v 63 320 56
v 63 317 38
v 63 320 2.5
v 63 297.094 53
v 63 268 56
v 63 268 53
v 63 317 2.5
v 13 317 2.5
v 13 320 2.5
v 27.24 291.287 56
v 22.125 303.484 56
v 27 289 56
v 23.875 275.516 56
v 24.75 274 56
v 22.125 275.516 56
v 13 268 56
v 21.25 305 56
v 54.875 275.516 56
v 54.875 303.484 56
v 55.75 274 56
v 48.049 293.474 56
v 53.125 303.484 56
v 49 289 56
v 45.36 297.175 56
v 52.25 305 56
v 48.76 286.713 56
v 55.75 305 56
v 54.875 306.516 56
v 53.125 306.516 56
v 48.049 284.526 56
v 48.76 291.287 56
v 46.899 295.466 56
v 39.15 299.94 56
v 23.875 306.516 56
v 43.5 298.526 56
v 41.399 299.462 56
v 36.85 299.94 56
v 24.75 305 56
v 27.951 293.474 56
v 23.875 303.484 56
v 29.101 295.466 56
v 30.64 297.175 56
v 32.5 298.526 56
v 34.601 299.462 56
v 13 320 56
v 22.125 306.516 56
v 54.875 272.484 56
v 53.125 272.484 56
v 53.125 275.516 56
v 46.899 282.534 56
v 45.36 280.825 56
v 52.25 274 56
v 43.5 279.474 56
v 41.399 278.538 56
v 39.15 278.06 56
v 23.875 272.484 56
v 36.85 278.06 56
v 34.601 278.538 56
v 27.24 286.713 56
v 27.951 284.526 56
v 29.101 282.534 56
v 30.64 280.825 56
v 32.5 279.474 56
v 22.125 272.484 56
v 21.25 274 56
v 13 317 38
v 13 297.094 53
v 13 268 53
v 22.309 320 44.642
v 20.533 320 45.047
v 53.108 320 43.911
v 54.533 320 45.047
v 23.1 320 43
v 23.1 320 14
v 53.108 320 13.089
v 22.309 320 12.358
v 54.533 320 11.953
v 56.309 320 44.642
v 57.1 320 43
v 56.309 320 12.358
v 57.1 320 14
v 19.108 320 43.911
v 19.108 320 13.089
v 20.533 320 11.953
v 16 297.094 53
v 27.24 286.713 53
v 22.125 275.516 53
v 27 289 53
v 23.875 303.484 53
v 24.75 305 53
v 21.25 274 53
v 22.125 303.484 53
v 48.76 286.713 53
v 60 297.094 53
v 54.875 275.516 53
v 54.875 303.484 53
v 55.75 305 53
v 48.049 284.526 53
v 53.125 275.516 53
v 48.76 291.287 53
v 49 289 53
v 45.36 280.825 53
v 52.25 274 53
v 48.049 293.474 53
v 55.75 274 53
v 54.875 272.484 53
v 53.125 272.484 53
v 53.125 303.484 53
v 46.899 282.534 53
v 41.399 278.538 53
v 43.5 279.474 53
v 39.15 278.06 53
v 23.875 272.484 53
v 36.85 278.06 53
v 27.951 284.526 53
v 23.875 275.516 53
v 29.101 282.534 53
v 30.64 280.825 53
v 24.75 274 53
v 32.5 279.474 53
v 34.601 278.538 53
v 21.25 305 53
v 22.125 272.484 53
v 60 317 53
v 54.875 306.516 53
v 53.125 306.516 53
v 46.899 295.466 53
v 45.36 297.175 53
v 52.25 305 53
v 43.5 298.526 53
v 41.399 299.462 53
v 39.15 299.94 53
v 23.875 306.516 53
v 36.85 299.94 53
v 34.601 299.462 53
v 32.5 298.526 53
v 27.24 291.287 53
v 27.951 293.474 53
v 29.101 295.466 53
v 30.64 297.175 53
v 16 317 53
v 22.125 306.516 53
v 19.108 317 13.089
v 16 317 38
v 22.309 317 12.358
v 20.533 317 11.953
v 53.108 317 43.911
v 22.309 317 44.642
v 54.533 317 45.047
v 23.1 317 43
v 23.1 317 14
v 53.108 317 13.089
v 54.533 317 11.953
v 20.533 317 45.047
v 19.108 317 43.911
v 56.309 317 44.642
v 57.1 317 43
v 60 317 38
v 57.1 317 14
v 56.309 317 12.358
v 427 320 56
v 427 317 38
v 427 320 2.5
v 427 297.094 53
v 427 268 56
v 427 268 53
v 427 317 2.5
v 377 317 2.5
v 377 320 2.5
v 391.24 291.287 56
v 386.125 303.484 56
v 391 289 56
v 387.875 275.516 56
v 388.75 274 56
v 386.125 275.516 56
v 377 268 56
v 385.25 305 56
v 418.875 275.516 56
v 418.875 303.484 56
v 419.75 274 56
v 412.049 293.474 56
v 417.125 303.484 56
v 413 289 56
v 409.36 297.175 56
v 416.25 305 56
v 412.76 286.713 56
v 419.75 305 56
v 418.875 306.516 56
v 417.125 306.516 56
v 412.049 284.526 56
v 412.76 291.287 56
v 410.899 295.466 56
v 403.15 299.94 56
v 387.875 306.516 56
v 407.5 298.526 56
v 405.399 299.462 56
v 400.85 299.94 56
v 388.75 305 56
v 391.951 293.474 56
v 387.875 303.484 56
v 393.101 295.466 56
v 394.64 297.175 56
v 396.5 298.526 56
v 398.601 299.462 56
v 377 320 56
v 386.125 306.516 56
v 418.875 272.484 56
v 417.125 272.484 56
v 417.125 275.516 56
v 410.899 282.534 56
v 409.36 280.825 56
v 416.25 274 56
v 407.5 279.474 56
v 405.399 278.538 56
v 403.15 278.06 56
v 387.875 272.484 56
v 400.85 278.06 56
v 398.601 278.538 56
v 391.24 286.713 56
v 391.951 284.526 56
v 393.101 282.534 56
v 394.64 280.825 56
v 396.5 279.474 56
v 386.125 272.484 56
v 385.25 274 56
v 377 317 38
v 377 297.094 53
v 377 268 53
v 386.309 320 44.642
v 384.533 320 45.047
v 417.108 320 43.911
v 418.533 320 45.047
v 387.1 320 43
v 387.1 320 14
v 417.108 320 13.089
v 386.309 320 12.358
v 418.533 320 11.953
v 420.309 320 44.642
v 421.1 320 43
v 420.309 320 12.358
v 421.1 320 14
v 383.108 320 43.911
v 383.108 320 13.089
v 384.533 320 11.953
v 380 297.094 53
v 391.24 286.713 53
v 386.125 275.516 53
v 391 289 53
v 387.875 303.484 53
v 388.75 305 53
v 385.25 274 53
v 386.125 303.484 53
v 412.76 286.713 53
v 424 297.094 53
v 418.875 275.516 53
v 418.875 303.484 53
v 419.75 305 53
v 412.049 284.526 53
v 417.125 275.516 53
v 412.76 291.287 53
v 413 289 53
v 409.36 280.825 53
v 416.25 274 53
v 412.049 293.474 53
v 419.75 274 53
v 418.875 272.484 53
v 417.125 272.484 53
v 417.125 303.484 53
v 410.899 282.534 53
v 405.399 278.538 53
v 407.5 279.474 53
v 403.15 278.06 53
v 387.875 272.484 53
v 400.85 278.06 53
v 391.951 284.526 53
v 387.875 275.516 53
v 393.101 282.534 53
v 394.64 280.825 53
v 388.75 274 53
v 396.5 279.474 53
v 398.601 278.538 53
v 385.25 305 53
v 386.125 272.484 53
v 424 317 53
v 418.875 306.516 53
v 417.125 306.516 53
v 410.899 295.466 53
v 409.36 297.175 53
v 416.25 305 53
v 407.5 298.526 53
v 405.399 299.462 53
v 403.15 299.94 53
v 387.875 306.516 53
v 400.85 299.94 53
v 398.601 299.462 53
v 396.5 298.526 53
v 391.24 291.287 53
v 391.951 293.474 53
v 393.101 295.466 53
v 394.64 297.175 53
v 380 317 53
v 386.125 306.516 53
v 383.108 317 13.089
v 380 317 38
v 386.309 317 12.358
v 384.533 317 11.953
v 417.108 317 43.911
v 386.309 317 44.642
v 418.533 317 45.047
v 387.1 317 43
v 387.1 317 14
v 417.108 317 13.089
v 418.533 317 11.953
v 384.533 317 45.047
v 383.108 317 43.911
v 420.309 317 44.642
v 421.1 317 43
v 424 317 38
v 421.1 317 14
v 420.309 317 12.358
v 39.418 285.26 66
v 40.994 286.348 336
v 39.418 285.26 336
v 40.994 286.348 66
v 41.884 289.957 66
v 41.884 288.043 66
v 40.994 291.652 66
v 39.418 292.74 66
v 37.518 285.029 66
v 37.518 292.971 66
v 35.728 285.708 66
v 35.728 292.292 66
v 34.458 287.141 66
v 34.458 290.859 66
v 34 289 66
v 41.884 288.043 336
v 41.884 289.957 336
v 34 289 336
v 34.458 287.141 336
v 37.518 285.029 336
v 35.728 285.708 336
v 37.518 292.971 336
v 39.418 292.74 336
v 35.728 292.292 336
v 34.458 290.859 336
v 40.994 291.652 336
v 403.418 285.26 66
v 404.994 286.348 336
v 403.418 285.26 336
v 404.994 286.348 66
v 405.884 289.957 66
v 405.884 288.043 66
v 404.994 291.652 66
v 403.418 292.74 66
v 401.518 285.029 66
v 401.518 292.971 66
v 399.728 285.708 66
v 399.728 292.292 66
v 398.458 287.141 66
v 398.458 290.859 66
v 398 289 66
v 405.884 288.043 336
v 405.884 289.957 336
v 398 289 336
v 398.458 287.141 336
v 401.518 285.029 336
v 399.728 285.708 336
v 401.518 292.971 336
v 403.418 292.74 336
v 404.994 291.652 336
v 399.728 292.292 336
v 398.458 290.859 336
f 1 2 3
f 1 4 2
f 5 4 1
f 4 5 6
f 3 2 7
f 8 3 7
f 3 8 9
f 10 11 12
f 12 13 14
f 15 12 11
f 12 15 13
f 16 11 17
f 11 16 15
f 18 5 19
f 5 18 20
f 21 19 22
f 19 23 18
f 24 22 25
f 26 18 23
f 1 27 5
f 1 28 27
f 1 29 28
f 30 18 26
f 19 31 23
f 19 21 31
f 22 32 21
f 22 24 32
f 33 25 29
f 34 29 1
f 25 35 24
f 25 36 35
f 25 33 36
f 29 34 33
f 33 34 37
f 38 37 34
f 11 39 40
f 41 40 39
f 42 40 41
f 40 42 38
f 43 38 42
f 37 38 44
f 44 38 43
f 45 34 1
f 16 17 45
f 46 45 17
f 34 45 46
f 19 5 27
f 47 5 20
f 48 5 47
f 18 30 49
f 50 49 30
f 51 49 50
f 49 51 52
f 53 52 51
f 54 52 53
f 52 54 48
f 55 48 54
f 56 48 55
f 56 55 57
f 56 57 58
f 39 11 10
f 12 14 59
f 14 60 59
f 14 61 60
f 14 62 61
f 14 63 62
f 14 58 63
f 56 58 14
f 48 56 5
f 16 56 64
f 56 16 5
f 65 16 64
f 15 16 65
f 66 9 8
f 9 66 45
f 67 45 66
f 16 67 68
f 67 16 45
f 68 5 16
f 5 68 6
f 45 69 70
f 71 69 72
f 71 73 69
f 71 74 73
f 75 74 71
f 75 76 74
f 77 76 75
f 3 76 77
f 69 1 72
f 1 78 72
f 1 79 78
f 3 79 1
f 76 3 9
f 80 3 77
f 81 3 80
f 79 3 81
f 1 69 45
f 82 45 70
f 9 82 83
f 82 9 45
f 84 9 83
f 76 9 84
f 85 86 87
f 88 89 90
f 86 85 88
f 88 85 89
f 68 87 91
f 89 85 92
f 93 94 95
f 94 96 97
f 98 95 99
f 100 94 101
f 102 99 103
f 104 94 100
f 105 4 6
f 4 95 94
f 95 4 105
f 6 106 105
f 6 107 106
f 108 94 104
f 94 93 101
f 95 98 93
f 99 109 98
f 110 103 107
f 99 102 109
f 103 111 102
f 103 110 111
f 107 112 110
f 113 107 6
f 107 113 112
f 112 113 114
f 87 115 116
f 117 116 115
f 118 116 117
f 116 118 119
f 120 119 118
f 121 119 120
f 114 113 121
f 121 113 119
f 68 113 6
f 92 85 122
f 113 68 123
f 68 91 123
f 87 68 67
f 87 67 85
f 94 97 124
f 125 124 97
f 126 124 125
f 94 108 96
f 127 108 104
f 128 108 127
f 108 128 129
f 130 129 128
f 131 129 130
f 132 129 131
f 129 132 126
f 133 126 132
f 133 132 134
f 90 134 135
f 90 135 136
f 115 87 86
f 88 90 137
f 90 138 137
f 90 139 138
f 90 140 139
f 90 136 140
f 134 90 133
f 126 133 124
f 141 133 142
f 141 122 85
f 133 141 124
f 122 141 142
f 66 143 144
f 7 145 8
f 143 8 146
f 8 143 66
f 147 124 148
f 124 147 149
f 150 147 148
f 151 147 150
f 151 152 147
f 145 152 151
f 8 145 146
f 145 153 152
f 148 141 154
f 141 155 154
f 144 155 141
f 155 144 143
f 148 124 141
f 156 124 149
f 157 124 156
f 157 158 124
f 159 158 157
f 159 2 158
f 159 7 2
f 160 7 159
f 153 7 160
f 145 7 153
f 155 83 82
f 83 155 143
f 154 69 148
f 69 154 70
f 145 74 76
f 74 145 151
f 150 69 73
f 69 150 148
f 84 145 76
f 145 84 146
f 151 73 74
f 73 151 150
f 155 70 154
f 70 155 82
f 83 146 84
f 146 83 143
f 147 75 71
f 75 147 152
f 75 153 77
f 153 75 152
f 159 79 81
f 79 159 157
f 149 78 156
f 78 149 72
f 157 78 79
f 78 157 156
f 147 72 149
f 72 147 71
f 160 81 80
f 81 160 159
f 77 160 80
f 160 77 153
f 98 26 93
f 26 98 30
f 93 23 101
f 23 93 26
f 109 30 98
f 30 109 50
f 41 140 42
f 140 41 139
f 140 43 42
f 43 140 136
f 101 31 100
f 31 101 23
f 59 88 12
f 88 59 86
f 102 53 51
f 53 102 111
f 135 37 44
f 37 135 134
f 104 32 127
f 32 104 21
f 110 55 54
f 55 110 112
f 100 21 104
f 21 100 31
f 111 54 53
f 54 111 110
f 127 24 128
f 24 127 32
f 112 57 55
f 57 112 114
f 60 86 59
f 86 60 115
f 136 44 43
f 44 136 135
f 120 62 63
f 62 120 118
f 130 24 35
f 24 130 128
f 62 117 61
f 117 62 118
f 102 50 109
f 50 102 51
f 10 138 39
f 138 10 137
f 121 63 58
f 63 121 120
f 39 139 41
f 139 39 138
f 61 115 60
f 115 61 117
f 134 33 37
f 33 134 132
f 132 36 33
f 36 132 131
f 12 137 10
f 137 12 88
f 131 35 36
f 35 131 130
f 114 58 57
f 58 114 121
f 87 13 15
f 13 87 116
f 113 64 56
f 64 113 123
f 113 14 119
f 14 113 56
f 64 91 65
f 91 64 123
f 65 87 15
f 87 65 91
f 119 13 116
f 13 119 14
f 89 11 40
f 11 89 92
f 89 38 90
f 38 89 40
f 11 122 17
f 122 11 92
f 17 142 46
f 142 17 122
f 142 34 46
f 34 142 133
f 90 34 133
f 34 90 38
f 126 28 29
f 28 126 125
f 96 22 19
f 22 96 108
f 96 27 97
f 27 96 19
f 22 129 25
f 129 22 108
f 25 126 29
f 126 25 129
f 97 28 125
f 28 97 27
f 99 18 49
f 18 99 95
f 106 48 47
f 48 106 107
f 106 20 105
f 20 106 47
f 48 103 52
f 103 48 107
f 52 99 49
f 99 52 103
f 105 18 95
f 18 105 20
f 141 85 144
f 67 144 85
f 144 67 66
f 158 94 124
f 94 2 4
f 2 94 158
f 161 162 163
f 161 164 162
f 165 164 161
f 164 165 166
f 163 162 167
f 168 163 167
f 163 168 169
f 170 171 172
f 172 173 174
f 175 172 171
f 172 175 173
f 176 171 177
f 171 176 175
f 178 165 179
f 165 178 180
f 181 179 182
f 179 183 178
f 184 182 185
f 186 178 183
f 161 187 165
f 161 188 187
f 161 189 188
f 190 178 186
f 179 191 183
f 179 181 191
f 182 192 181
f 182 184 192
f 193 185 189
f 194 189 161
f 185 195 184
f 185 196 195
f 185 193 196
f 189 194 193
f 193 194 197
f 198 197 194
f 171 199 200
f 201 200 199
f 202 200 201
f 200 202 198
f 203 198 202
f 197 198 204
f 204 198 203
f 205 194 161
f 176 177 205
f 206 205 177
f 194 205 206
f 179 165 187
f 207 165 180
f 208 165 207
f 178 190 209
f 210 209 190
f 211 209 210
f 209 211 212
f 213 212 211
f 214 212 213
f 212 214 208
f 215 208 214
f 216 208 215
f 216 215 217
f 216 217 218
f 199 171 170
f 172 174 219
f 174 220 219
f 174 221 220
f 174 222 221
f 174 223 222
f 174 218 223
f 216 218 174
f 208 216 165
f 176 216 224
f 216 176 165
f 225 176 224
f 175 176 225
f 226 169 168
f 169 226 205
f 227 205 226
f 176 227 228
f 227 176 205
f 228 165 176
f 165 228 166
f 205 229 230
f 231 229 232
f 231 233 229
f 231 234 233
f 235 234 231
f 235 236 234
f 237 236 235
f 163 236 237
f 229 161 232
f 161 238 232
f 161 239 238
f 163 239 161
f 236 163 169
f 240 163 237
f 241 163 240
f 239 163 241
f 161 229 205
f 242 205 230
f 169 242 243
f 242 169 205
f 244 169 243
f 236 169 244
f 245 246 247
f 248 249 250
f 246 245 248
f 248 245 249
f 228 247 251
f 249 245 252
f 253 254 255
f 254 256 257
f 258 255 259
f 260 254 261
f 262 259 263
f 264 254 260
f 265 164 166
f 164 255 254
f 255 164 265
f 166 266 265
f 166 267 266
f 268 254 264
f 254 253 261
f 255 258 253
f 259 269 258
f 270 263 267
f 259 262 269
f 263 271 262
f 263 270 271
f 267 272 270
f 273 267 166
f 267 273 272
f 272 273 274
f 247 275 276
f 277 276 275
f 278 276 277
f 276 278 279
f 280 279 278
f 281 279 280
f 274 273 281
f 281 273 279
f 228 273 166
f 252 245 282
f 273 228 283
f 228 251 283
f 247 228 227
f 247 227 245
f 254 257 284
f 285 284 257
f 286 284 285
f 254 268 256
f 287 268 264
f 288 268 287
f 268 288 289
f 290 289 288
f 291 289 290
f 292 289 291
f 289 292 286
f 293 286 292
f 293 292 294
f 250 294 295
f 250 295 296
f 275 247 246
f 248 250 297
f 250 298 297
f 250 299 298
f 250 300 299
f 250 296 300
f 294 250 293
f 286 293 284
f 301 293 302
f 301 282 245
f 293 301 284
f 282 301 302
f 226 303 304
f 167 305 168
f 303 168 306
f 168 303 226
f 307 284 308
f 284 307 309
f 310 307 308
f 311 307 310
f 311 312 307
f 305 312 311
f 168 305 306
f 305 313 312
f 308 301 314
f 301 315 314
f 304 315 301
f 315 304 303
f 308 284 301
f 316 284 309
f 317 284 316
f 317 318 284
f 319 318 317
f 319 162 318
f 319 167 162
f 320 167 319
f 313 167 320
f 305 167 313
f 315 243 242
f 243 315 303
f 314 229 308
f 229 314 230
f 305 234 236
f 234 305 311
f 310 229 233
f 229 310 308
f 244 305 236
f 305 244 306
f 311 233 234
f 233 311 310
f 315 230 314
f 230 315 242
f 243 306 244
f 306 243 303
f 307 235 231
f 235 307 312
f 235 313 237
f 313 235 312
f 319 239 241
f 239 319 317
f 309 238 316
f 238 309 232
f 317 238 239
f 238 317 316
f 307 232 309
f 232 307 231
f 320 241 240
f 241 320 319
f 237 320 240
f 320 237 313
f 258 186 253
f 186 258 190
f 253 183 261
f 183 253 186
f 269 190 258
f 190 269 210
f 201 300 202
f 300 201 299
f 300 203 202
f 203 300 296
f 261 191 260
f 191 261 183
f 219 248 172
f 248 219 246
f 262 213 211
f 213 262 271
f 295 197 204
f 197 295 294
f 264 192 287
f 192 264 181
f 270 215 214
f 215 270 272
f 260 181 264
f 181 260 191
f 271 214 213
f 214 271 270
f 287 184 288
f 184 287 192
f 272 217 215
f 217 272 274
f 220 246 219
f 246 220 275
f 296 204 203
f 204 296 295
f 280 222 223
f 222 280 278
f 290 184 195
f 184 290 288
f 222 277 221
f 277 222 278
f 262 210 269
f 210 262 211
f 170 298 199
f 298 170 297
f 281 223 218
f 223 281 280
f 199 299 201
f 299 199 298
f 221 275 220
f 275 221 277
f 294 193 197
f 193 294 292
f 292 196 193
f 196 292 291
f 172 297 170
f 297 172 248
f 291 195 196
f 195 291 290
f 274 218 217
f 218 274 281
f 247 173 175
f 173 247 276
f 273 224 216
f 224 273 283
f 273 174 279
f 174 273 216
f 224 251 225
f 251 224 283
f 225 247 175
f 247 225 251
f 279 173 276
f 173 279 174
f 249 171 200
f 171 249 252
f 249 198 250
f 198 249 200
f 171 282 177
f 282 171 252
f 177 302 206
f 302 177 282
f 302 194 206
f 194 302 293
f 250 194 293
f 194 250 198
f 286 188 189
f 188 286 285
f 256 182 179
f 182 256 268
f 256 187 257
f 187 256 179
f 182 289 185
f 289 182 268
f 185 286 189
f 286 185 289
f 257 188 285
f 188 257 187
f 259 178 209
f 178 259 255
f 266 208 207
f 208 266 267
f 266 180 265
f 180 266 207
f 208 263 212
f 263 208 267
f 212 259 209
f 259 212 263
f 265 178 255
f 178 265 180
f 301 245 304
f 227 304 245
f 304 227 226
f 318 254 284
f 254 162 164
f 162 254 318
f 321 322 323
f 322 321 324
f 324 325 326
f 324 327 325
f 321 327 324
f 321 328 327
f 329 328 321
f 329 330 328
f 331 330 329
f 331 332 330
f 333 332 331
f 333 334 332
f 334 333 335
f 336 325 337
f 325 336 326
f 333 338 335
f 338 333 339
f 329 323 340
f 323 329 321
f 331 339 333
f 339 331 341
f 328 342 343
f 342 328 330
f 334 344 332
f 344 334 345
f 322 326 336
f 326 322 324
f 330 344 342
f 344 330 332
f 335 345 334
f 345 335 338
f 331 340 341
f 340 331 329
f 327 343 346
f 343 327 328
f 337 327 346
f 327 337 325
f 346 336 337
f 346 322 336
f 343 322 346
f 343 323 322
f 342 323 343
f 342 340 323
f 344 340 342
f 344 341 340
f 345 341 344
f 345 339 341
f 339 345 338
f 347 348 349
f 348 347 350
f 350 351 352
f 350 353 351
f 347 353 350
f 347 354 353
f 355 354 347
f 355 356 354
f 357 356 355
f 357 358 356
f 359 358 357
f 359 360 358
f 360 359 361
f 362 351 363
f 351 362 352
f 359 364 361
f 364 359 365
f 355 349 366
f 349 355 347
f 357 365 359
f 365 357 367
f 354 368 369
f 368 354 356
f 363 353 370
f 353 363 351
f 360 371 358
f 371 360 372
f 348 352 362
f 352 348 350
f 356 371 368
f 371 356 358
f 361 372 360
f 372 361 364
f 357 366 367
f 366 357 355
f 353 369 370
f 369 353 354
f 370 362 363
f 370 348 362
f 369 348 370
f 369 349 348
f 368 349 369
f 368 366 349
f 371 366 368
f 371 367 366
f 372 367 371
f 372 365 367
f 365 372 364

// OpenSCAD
/*
Stepper steel mount
*/
module StepperMount (){
color( "Black", 1 ) {
union (){
difference (){
   
     cube ([50,52,53.5]) ; 
    
     // difference starts here  
   translate ([-1,3,3]) 
     cube ([52,52,53.5]) ; 
    hull() {
        translate ([8,3,13]) rotate ([90,0,0])
        cylinder(d=4.2,h=10, center = true);
            translate ([8,3,42]) rotate ([90,0,0])
        cylinder(d=4.2,h=10, center = true);
       }
    hull() {
        translate ([42,3,13]) rotate ([90,0,0])
        cylinder(d=4.2,h=10, center = true);
        translate ([42,3,42]) rotate ([90,0,0])
        cylinder(d=4.2,h=10, center = true);
    }
        translate ([25,31,-1])
        cylinder(d=22,h=10, center = true);
        translate ([10,46,-1])
        cylinder(d=3.5,h=10, center = true);
        translate ([10,15,-1])
        cylinder(d=3.5,h=10, center = true);
        translate ([41,15,-1])
        cylinder(d=3.5,h=10, center = true);
        translate ([41,46,-1])
        cylinder(d=3.5,h=10, center = true);

}
difference (){
        translate ([0,3,3])
        cube ([3,20,15]) ; 
        translate ([4,3,18]) rotate ([127,0,180])
        cube ([5,20,30]) ; 
}
difference (){
        translate ([47,3,3])
        cube ([3,20,15]) ; 
        translate ([51,3,18]) rotate ([127,0,180])
        cube ([5,20,30]) ; 
}
}
}
}
// Place the stepper mounts
translate ([13,320 ,56]) rotate ([0,180,180])
StepperMount ();

translate ([377,320 ,56]) rotate ([0,180,180])
StepperMount ();

//  the CoreXY drive shafts
color( "Silver", 1 ) {
translate ([38,289 ,66]) rotate ([0,0,180])
cylinder(d=8,h=270, center = false);
translate ([402,289 ,66]) rotate ([0,0,180])
cylinder(d=8,h=270, center = false);
}
